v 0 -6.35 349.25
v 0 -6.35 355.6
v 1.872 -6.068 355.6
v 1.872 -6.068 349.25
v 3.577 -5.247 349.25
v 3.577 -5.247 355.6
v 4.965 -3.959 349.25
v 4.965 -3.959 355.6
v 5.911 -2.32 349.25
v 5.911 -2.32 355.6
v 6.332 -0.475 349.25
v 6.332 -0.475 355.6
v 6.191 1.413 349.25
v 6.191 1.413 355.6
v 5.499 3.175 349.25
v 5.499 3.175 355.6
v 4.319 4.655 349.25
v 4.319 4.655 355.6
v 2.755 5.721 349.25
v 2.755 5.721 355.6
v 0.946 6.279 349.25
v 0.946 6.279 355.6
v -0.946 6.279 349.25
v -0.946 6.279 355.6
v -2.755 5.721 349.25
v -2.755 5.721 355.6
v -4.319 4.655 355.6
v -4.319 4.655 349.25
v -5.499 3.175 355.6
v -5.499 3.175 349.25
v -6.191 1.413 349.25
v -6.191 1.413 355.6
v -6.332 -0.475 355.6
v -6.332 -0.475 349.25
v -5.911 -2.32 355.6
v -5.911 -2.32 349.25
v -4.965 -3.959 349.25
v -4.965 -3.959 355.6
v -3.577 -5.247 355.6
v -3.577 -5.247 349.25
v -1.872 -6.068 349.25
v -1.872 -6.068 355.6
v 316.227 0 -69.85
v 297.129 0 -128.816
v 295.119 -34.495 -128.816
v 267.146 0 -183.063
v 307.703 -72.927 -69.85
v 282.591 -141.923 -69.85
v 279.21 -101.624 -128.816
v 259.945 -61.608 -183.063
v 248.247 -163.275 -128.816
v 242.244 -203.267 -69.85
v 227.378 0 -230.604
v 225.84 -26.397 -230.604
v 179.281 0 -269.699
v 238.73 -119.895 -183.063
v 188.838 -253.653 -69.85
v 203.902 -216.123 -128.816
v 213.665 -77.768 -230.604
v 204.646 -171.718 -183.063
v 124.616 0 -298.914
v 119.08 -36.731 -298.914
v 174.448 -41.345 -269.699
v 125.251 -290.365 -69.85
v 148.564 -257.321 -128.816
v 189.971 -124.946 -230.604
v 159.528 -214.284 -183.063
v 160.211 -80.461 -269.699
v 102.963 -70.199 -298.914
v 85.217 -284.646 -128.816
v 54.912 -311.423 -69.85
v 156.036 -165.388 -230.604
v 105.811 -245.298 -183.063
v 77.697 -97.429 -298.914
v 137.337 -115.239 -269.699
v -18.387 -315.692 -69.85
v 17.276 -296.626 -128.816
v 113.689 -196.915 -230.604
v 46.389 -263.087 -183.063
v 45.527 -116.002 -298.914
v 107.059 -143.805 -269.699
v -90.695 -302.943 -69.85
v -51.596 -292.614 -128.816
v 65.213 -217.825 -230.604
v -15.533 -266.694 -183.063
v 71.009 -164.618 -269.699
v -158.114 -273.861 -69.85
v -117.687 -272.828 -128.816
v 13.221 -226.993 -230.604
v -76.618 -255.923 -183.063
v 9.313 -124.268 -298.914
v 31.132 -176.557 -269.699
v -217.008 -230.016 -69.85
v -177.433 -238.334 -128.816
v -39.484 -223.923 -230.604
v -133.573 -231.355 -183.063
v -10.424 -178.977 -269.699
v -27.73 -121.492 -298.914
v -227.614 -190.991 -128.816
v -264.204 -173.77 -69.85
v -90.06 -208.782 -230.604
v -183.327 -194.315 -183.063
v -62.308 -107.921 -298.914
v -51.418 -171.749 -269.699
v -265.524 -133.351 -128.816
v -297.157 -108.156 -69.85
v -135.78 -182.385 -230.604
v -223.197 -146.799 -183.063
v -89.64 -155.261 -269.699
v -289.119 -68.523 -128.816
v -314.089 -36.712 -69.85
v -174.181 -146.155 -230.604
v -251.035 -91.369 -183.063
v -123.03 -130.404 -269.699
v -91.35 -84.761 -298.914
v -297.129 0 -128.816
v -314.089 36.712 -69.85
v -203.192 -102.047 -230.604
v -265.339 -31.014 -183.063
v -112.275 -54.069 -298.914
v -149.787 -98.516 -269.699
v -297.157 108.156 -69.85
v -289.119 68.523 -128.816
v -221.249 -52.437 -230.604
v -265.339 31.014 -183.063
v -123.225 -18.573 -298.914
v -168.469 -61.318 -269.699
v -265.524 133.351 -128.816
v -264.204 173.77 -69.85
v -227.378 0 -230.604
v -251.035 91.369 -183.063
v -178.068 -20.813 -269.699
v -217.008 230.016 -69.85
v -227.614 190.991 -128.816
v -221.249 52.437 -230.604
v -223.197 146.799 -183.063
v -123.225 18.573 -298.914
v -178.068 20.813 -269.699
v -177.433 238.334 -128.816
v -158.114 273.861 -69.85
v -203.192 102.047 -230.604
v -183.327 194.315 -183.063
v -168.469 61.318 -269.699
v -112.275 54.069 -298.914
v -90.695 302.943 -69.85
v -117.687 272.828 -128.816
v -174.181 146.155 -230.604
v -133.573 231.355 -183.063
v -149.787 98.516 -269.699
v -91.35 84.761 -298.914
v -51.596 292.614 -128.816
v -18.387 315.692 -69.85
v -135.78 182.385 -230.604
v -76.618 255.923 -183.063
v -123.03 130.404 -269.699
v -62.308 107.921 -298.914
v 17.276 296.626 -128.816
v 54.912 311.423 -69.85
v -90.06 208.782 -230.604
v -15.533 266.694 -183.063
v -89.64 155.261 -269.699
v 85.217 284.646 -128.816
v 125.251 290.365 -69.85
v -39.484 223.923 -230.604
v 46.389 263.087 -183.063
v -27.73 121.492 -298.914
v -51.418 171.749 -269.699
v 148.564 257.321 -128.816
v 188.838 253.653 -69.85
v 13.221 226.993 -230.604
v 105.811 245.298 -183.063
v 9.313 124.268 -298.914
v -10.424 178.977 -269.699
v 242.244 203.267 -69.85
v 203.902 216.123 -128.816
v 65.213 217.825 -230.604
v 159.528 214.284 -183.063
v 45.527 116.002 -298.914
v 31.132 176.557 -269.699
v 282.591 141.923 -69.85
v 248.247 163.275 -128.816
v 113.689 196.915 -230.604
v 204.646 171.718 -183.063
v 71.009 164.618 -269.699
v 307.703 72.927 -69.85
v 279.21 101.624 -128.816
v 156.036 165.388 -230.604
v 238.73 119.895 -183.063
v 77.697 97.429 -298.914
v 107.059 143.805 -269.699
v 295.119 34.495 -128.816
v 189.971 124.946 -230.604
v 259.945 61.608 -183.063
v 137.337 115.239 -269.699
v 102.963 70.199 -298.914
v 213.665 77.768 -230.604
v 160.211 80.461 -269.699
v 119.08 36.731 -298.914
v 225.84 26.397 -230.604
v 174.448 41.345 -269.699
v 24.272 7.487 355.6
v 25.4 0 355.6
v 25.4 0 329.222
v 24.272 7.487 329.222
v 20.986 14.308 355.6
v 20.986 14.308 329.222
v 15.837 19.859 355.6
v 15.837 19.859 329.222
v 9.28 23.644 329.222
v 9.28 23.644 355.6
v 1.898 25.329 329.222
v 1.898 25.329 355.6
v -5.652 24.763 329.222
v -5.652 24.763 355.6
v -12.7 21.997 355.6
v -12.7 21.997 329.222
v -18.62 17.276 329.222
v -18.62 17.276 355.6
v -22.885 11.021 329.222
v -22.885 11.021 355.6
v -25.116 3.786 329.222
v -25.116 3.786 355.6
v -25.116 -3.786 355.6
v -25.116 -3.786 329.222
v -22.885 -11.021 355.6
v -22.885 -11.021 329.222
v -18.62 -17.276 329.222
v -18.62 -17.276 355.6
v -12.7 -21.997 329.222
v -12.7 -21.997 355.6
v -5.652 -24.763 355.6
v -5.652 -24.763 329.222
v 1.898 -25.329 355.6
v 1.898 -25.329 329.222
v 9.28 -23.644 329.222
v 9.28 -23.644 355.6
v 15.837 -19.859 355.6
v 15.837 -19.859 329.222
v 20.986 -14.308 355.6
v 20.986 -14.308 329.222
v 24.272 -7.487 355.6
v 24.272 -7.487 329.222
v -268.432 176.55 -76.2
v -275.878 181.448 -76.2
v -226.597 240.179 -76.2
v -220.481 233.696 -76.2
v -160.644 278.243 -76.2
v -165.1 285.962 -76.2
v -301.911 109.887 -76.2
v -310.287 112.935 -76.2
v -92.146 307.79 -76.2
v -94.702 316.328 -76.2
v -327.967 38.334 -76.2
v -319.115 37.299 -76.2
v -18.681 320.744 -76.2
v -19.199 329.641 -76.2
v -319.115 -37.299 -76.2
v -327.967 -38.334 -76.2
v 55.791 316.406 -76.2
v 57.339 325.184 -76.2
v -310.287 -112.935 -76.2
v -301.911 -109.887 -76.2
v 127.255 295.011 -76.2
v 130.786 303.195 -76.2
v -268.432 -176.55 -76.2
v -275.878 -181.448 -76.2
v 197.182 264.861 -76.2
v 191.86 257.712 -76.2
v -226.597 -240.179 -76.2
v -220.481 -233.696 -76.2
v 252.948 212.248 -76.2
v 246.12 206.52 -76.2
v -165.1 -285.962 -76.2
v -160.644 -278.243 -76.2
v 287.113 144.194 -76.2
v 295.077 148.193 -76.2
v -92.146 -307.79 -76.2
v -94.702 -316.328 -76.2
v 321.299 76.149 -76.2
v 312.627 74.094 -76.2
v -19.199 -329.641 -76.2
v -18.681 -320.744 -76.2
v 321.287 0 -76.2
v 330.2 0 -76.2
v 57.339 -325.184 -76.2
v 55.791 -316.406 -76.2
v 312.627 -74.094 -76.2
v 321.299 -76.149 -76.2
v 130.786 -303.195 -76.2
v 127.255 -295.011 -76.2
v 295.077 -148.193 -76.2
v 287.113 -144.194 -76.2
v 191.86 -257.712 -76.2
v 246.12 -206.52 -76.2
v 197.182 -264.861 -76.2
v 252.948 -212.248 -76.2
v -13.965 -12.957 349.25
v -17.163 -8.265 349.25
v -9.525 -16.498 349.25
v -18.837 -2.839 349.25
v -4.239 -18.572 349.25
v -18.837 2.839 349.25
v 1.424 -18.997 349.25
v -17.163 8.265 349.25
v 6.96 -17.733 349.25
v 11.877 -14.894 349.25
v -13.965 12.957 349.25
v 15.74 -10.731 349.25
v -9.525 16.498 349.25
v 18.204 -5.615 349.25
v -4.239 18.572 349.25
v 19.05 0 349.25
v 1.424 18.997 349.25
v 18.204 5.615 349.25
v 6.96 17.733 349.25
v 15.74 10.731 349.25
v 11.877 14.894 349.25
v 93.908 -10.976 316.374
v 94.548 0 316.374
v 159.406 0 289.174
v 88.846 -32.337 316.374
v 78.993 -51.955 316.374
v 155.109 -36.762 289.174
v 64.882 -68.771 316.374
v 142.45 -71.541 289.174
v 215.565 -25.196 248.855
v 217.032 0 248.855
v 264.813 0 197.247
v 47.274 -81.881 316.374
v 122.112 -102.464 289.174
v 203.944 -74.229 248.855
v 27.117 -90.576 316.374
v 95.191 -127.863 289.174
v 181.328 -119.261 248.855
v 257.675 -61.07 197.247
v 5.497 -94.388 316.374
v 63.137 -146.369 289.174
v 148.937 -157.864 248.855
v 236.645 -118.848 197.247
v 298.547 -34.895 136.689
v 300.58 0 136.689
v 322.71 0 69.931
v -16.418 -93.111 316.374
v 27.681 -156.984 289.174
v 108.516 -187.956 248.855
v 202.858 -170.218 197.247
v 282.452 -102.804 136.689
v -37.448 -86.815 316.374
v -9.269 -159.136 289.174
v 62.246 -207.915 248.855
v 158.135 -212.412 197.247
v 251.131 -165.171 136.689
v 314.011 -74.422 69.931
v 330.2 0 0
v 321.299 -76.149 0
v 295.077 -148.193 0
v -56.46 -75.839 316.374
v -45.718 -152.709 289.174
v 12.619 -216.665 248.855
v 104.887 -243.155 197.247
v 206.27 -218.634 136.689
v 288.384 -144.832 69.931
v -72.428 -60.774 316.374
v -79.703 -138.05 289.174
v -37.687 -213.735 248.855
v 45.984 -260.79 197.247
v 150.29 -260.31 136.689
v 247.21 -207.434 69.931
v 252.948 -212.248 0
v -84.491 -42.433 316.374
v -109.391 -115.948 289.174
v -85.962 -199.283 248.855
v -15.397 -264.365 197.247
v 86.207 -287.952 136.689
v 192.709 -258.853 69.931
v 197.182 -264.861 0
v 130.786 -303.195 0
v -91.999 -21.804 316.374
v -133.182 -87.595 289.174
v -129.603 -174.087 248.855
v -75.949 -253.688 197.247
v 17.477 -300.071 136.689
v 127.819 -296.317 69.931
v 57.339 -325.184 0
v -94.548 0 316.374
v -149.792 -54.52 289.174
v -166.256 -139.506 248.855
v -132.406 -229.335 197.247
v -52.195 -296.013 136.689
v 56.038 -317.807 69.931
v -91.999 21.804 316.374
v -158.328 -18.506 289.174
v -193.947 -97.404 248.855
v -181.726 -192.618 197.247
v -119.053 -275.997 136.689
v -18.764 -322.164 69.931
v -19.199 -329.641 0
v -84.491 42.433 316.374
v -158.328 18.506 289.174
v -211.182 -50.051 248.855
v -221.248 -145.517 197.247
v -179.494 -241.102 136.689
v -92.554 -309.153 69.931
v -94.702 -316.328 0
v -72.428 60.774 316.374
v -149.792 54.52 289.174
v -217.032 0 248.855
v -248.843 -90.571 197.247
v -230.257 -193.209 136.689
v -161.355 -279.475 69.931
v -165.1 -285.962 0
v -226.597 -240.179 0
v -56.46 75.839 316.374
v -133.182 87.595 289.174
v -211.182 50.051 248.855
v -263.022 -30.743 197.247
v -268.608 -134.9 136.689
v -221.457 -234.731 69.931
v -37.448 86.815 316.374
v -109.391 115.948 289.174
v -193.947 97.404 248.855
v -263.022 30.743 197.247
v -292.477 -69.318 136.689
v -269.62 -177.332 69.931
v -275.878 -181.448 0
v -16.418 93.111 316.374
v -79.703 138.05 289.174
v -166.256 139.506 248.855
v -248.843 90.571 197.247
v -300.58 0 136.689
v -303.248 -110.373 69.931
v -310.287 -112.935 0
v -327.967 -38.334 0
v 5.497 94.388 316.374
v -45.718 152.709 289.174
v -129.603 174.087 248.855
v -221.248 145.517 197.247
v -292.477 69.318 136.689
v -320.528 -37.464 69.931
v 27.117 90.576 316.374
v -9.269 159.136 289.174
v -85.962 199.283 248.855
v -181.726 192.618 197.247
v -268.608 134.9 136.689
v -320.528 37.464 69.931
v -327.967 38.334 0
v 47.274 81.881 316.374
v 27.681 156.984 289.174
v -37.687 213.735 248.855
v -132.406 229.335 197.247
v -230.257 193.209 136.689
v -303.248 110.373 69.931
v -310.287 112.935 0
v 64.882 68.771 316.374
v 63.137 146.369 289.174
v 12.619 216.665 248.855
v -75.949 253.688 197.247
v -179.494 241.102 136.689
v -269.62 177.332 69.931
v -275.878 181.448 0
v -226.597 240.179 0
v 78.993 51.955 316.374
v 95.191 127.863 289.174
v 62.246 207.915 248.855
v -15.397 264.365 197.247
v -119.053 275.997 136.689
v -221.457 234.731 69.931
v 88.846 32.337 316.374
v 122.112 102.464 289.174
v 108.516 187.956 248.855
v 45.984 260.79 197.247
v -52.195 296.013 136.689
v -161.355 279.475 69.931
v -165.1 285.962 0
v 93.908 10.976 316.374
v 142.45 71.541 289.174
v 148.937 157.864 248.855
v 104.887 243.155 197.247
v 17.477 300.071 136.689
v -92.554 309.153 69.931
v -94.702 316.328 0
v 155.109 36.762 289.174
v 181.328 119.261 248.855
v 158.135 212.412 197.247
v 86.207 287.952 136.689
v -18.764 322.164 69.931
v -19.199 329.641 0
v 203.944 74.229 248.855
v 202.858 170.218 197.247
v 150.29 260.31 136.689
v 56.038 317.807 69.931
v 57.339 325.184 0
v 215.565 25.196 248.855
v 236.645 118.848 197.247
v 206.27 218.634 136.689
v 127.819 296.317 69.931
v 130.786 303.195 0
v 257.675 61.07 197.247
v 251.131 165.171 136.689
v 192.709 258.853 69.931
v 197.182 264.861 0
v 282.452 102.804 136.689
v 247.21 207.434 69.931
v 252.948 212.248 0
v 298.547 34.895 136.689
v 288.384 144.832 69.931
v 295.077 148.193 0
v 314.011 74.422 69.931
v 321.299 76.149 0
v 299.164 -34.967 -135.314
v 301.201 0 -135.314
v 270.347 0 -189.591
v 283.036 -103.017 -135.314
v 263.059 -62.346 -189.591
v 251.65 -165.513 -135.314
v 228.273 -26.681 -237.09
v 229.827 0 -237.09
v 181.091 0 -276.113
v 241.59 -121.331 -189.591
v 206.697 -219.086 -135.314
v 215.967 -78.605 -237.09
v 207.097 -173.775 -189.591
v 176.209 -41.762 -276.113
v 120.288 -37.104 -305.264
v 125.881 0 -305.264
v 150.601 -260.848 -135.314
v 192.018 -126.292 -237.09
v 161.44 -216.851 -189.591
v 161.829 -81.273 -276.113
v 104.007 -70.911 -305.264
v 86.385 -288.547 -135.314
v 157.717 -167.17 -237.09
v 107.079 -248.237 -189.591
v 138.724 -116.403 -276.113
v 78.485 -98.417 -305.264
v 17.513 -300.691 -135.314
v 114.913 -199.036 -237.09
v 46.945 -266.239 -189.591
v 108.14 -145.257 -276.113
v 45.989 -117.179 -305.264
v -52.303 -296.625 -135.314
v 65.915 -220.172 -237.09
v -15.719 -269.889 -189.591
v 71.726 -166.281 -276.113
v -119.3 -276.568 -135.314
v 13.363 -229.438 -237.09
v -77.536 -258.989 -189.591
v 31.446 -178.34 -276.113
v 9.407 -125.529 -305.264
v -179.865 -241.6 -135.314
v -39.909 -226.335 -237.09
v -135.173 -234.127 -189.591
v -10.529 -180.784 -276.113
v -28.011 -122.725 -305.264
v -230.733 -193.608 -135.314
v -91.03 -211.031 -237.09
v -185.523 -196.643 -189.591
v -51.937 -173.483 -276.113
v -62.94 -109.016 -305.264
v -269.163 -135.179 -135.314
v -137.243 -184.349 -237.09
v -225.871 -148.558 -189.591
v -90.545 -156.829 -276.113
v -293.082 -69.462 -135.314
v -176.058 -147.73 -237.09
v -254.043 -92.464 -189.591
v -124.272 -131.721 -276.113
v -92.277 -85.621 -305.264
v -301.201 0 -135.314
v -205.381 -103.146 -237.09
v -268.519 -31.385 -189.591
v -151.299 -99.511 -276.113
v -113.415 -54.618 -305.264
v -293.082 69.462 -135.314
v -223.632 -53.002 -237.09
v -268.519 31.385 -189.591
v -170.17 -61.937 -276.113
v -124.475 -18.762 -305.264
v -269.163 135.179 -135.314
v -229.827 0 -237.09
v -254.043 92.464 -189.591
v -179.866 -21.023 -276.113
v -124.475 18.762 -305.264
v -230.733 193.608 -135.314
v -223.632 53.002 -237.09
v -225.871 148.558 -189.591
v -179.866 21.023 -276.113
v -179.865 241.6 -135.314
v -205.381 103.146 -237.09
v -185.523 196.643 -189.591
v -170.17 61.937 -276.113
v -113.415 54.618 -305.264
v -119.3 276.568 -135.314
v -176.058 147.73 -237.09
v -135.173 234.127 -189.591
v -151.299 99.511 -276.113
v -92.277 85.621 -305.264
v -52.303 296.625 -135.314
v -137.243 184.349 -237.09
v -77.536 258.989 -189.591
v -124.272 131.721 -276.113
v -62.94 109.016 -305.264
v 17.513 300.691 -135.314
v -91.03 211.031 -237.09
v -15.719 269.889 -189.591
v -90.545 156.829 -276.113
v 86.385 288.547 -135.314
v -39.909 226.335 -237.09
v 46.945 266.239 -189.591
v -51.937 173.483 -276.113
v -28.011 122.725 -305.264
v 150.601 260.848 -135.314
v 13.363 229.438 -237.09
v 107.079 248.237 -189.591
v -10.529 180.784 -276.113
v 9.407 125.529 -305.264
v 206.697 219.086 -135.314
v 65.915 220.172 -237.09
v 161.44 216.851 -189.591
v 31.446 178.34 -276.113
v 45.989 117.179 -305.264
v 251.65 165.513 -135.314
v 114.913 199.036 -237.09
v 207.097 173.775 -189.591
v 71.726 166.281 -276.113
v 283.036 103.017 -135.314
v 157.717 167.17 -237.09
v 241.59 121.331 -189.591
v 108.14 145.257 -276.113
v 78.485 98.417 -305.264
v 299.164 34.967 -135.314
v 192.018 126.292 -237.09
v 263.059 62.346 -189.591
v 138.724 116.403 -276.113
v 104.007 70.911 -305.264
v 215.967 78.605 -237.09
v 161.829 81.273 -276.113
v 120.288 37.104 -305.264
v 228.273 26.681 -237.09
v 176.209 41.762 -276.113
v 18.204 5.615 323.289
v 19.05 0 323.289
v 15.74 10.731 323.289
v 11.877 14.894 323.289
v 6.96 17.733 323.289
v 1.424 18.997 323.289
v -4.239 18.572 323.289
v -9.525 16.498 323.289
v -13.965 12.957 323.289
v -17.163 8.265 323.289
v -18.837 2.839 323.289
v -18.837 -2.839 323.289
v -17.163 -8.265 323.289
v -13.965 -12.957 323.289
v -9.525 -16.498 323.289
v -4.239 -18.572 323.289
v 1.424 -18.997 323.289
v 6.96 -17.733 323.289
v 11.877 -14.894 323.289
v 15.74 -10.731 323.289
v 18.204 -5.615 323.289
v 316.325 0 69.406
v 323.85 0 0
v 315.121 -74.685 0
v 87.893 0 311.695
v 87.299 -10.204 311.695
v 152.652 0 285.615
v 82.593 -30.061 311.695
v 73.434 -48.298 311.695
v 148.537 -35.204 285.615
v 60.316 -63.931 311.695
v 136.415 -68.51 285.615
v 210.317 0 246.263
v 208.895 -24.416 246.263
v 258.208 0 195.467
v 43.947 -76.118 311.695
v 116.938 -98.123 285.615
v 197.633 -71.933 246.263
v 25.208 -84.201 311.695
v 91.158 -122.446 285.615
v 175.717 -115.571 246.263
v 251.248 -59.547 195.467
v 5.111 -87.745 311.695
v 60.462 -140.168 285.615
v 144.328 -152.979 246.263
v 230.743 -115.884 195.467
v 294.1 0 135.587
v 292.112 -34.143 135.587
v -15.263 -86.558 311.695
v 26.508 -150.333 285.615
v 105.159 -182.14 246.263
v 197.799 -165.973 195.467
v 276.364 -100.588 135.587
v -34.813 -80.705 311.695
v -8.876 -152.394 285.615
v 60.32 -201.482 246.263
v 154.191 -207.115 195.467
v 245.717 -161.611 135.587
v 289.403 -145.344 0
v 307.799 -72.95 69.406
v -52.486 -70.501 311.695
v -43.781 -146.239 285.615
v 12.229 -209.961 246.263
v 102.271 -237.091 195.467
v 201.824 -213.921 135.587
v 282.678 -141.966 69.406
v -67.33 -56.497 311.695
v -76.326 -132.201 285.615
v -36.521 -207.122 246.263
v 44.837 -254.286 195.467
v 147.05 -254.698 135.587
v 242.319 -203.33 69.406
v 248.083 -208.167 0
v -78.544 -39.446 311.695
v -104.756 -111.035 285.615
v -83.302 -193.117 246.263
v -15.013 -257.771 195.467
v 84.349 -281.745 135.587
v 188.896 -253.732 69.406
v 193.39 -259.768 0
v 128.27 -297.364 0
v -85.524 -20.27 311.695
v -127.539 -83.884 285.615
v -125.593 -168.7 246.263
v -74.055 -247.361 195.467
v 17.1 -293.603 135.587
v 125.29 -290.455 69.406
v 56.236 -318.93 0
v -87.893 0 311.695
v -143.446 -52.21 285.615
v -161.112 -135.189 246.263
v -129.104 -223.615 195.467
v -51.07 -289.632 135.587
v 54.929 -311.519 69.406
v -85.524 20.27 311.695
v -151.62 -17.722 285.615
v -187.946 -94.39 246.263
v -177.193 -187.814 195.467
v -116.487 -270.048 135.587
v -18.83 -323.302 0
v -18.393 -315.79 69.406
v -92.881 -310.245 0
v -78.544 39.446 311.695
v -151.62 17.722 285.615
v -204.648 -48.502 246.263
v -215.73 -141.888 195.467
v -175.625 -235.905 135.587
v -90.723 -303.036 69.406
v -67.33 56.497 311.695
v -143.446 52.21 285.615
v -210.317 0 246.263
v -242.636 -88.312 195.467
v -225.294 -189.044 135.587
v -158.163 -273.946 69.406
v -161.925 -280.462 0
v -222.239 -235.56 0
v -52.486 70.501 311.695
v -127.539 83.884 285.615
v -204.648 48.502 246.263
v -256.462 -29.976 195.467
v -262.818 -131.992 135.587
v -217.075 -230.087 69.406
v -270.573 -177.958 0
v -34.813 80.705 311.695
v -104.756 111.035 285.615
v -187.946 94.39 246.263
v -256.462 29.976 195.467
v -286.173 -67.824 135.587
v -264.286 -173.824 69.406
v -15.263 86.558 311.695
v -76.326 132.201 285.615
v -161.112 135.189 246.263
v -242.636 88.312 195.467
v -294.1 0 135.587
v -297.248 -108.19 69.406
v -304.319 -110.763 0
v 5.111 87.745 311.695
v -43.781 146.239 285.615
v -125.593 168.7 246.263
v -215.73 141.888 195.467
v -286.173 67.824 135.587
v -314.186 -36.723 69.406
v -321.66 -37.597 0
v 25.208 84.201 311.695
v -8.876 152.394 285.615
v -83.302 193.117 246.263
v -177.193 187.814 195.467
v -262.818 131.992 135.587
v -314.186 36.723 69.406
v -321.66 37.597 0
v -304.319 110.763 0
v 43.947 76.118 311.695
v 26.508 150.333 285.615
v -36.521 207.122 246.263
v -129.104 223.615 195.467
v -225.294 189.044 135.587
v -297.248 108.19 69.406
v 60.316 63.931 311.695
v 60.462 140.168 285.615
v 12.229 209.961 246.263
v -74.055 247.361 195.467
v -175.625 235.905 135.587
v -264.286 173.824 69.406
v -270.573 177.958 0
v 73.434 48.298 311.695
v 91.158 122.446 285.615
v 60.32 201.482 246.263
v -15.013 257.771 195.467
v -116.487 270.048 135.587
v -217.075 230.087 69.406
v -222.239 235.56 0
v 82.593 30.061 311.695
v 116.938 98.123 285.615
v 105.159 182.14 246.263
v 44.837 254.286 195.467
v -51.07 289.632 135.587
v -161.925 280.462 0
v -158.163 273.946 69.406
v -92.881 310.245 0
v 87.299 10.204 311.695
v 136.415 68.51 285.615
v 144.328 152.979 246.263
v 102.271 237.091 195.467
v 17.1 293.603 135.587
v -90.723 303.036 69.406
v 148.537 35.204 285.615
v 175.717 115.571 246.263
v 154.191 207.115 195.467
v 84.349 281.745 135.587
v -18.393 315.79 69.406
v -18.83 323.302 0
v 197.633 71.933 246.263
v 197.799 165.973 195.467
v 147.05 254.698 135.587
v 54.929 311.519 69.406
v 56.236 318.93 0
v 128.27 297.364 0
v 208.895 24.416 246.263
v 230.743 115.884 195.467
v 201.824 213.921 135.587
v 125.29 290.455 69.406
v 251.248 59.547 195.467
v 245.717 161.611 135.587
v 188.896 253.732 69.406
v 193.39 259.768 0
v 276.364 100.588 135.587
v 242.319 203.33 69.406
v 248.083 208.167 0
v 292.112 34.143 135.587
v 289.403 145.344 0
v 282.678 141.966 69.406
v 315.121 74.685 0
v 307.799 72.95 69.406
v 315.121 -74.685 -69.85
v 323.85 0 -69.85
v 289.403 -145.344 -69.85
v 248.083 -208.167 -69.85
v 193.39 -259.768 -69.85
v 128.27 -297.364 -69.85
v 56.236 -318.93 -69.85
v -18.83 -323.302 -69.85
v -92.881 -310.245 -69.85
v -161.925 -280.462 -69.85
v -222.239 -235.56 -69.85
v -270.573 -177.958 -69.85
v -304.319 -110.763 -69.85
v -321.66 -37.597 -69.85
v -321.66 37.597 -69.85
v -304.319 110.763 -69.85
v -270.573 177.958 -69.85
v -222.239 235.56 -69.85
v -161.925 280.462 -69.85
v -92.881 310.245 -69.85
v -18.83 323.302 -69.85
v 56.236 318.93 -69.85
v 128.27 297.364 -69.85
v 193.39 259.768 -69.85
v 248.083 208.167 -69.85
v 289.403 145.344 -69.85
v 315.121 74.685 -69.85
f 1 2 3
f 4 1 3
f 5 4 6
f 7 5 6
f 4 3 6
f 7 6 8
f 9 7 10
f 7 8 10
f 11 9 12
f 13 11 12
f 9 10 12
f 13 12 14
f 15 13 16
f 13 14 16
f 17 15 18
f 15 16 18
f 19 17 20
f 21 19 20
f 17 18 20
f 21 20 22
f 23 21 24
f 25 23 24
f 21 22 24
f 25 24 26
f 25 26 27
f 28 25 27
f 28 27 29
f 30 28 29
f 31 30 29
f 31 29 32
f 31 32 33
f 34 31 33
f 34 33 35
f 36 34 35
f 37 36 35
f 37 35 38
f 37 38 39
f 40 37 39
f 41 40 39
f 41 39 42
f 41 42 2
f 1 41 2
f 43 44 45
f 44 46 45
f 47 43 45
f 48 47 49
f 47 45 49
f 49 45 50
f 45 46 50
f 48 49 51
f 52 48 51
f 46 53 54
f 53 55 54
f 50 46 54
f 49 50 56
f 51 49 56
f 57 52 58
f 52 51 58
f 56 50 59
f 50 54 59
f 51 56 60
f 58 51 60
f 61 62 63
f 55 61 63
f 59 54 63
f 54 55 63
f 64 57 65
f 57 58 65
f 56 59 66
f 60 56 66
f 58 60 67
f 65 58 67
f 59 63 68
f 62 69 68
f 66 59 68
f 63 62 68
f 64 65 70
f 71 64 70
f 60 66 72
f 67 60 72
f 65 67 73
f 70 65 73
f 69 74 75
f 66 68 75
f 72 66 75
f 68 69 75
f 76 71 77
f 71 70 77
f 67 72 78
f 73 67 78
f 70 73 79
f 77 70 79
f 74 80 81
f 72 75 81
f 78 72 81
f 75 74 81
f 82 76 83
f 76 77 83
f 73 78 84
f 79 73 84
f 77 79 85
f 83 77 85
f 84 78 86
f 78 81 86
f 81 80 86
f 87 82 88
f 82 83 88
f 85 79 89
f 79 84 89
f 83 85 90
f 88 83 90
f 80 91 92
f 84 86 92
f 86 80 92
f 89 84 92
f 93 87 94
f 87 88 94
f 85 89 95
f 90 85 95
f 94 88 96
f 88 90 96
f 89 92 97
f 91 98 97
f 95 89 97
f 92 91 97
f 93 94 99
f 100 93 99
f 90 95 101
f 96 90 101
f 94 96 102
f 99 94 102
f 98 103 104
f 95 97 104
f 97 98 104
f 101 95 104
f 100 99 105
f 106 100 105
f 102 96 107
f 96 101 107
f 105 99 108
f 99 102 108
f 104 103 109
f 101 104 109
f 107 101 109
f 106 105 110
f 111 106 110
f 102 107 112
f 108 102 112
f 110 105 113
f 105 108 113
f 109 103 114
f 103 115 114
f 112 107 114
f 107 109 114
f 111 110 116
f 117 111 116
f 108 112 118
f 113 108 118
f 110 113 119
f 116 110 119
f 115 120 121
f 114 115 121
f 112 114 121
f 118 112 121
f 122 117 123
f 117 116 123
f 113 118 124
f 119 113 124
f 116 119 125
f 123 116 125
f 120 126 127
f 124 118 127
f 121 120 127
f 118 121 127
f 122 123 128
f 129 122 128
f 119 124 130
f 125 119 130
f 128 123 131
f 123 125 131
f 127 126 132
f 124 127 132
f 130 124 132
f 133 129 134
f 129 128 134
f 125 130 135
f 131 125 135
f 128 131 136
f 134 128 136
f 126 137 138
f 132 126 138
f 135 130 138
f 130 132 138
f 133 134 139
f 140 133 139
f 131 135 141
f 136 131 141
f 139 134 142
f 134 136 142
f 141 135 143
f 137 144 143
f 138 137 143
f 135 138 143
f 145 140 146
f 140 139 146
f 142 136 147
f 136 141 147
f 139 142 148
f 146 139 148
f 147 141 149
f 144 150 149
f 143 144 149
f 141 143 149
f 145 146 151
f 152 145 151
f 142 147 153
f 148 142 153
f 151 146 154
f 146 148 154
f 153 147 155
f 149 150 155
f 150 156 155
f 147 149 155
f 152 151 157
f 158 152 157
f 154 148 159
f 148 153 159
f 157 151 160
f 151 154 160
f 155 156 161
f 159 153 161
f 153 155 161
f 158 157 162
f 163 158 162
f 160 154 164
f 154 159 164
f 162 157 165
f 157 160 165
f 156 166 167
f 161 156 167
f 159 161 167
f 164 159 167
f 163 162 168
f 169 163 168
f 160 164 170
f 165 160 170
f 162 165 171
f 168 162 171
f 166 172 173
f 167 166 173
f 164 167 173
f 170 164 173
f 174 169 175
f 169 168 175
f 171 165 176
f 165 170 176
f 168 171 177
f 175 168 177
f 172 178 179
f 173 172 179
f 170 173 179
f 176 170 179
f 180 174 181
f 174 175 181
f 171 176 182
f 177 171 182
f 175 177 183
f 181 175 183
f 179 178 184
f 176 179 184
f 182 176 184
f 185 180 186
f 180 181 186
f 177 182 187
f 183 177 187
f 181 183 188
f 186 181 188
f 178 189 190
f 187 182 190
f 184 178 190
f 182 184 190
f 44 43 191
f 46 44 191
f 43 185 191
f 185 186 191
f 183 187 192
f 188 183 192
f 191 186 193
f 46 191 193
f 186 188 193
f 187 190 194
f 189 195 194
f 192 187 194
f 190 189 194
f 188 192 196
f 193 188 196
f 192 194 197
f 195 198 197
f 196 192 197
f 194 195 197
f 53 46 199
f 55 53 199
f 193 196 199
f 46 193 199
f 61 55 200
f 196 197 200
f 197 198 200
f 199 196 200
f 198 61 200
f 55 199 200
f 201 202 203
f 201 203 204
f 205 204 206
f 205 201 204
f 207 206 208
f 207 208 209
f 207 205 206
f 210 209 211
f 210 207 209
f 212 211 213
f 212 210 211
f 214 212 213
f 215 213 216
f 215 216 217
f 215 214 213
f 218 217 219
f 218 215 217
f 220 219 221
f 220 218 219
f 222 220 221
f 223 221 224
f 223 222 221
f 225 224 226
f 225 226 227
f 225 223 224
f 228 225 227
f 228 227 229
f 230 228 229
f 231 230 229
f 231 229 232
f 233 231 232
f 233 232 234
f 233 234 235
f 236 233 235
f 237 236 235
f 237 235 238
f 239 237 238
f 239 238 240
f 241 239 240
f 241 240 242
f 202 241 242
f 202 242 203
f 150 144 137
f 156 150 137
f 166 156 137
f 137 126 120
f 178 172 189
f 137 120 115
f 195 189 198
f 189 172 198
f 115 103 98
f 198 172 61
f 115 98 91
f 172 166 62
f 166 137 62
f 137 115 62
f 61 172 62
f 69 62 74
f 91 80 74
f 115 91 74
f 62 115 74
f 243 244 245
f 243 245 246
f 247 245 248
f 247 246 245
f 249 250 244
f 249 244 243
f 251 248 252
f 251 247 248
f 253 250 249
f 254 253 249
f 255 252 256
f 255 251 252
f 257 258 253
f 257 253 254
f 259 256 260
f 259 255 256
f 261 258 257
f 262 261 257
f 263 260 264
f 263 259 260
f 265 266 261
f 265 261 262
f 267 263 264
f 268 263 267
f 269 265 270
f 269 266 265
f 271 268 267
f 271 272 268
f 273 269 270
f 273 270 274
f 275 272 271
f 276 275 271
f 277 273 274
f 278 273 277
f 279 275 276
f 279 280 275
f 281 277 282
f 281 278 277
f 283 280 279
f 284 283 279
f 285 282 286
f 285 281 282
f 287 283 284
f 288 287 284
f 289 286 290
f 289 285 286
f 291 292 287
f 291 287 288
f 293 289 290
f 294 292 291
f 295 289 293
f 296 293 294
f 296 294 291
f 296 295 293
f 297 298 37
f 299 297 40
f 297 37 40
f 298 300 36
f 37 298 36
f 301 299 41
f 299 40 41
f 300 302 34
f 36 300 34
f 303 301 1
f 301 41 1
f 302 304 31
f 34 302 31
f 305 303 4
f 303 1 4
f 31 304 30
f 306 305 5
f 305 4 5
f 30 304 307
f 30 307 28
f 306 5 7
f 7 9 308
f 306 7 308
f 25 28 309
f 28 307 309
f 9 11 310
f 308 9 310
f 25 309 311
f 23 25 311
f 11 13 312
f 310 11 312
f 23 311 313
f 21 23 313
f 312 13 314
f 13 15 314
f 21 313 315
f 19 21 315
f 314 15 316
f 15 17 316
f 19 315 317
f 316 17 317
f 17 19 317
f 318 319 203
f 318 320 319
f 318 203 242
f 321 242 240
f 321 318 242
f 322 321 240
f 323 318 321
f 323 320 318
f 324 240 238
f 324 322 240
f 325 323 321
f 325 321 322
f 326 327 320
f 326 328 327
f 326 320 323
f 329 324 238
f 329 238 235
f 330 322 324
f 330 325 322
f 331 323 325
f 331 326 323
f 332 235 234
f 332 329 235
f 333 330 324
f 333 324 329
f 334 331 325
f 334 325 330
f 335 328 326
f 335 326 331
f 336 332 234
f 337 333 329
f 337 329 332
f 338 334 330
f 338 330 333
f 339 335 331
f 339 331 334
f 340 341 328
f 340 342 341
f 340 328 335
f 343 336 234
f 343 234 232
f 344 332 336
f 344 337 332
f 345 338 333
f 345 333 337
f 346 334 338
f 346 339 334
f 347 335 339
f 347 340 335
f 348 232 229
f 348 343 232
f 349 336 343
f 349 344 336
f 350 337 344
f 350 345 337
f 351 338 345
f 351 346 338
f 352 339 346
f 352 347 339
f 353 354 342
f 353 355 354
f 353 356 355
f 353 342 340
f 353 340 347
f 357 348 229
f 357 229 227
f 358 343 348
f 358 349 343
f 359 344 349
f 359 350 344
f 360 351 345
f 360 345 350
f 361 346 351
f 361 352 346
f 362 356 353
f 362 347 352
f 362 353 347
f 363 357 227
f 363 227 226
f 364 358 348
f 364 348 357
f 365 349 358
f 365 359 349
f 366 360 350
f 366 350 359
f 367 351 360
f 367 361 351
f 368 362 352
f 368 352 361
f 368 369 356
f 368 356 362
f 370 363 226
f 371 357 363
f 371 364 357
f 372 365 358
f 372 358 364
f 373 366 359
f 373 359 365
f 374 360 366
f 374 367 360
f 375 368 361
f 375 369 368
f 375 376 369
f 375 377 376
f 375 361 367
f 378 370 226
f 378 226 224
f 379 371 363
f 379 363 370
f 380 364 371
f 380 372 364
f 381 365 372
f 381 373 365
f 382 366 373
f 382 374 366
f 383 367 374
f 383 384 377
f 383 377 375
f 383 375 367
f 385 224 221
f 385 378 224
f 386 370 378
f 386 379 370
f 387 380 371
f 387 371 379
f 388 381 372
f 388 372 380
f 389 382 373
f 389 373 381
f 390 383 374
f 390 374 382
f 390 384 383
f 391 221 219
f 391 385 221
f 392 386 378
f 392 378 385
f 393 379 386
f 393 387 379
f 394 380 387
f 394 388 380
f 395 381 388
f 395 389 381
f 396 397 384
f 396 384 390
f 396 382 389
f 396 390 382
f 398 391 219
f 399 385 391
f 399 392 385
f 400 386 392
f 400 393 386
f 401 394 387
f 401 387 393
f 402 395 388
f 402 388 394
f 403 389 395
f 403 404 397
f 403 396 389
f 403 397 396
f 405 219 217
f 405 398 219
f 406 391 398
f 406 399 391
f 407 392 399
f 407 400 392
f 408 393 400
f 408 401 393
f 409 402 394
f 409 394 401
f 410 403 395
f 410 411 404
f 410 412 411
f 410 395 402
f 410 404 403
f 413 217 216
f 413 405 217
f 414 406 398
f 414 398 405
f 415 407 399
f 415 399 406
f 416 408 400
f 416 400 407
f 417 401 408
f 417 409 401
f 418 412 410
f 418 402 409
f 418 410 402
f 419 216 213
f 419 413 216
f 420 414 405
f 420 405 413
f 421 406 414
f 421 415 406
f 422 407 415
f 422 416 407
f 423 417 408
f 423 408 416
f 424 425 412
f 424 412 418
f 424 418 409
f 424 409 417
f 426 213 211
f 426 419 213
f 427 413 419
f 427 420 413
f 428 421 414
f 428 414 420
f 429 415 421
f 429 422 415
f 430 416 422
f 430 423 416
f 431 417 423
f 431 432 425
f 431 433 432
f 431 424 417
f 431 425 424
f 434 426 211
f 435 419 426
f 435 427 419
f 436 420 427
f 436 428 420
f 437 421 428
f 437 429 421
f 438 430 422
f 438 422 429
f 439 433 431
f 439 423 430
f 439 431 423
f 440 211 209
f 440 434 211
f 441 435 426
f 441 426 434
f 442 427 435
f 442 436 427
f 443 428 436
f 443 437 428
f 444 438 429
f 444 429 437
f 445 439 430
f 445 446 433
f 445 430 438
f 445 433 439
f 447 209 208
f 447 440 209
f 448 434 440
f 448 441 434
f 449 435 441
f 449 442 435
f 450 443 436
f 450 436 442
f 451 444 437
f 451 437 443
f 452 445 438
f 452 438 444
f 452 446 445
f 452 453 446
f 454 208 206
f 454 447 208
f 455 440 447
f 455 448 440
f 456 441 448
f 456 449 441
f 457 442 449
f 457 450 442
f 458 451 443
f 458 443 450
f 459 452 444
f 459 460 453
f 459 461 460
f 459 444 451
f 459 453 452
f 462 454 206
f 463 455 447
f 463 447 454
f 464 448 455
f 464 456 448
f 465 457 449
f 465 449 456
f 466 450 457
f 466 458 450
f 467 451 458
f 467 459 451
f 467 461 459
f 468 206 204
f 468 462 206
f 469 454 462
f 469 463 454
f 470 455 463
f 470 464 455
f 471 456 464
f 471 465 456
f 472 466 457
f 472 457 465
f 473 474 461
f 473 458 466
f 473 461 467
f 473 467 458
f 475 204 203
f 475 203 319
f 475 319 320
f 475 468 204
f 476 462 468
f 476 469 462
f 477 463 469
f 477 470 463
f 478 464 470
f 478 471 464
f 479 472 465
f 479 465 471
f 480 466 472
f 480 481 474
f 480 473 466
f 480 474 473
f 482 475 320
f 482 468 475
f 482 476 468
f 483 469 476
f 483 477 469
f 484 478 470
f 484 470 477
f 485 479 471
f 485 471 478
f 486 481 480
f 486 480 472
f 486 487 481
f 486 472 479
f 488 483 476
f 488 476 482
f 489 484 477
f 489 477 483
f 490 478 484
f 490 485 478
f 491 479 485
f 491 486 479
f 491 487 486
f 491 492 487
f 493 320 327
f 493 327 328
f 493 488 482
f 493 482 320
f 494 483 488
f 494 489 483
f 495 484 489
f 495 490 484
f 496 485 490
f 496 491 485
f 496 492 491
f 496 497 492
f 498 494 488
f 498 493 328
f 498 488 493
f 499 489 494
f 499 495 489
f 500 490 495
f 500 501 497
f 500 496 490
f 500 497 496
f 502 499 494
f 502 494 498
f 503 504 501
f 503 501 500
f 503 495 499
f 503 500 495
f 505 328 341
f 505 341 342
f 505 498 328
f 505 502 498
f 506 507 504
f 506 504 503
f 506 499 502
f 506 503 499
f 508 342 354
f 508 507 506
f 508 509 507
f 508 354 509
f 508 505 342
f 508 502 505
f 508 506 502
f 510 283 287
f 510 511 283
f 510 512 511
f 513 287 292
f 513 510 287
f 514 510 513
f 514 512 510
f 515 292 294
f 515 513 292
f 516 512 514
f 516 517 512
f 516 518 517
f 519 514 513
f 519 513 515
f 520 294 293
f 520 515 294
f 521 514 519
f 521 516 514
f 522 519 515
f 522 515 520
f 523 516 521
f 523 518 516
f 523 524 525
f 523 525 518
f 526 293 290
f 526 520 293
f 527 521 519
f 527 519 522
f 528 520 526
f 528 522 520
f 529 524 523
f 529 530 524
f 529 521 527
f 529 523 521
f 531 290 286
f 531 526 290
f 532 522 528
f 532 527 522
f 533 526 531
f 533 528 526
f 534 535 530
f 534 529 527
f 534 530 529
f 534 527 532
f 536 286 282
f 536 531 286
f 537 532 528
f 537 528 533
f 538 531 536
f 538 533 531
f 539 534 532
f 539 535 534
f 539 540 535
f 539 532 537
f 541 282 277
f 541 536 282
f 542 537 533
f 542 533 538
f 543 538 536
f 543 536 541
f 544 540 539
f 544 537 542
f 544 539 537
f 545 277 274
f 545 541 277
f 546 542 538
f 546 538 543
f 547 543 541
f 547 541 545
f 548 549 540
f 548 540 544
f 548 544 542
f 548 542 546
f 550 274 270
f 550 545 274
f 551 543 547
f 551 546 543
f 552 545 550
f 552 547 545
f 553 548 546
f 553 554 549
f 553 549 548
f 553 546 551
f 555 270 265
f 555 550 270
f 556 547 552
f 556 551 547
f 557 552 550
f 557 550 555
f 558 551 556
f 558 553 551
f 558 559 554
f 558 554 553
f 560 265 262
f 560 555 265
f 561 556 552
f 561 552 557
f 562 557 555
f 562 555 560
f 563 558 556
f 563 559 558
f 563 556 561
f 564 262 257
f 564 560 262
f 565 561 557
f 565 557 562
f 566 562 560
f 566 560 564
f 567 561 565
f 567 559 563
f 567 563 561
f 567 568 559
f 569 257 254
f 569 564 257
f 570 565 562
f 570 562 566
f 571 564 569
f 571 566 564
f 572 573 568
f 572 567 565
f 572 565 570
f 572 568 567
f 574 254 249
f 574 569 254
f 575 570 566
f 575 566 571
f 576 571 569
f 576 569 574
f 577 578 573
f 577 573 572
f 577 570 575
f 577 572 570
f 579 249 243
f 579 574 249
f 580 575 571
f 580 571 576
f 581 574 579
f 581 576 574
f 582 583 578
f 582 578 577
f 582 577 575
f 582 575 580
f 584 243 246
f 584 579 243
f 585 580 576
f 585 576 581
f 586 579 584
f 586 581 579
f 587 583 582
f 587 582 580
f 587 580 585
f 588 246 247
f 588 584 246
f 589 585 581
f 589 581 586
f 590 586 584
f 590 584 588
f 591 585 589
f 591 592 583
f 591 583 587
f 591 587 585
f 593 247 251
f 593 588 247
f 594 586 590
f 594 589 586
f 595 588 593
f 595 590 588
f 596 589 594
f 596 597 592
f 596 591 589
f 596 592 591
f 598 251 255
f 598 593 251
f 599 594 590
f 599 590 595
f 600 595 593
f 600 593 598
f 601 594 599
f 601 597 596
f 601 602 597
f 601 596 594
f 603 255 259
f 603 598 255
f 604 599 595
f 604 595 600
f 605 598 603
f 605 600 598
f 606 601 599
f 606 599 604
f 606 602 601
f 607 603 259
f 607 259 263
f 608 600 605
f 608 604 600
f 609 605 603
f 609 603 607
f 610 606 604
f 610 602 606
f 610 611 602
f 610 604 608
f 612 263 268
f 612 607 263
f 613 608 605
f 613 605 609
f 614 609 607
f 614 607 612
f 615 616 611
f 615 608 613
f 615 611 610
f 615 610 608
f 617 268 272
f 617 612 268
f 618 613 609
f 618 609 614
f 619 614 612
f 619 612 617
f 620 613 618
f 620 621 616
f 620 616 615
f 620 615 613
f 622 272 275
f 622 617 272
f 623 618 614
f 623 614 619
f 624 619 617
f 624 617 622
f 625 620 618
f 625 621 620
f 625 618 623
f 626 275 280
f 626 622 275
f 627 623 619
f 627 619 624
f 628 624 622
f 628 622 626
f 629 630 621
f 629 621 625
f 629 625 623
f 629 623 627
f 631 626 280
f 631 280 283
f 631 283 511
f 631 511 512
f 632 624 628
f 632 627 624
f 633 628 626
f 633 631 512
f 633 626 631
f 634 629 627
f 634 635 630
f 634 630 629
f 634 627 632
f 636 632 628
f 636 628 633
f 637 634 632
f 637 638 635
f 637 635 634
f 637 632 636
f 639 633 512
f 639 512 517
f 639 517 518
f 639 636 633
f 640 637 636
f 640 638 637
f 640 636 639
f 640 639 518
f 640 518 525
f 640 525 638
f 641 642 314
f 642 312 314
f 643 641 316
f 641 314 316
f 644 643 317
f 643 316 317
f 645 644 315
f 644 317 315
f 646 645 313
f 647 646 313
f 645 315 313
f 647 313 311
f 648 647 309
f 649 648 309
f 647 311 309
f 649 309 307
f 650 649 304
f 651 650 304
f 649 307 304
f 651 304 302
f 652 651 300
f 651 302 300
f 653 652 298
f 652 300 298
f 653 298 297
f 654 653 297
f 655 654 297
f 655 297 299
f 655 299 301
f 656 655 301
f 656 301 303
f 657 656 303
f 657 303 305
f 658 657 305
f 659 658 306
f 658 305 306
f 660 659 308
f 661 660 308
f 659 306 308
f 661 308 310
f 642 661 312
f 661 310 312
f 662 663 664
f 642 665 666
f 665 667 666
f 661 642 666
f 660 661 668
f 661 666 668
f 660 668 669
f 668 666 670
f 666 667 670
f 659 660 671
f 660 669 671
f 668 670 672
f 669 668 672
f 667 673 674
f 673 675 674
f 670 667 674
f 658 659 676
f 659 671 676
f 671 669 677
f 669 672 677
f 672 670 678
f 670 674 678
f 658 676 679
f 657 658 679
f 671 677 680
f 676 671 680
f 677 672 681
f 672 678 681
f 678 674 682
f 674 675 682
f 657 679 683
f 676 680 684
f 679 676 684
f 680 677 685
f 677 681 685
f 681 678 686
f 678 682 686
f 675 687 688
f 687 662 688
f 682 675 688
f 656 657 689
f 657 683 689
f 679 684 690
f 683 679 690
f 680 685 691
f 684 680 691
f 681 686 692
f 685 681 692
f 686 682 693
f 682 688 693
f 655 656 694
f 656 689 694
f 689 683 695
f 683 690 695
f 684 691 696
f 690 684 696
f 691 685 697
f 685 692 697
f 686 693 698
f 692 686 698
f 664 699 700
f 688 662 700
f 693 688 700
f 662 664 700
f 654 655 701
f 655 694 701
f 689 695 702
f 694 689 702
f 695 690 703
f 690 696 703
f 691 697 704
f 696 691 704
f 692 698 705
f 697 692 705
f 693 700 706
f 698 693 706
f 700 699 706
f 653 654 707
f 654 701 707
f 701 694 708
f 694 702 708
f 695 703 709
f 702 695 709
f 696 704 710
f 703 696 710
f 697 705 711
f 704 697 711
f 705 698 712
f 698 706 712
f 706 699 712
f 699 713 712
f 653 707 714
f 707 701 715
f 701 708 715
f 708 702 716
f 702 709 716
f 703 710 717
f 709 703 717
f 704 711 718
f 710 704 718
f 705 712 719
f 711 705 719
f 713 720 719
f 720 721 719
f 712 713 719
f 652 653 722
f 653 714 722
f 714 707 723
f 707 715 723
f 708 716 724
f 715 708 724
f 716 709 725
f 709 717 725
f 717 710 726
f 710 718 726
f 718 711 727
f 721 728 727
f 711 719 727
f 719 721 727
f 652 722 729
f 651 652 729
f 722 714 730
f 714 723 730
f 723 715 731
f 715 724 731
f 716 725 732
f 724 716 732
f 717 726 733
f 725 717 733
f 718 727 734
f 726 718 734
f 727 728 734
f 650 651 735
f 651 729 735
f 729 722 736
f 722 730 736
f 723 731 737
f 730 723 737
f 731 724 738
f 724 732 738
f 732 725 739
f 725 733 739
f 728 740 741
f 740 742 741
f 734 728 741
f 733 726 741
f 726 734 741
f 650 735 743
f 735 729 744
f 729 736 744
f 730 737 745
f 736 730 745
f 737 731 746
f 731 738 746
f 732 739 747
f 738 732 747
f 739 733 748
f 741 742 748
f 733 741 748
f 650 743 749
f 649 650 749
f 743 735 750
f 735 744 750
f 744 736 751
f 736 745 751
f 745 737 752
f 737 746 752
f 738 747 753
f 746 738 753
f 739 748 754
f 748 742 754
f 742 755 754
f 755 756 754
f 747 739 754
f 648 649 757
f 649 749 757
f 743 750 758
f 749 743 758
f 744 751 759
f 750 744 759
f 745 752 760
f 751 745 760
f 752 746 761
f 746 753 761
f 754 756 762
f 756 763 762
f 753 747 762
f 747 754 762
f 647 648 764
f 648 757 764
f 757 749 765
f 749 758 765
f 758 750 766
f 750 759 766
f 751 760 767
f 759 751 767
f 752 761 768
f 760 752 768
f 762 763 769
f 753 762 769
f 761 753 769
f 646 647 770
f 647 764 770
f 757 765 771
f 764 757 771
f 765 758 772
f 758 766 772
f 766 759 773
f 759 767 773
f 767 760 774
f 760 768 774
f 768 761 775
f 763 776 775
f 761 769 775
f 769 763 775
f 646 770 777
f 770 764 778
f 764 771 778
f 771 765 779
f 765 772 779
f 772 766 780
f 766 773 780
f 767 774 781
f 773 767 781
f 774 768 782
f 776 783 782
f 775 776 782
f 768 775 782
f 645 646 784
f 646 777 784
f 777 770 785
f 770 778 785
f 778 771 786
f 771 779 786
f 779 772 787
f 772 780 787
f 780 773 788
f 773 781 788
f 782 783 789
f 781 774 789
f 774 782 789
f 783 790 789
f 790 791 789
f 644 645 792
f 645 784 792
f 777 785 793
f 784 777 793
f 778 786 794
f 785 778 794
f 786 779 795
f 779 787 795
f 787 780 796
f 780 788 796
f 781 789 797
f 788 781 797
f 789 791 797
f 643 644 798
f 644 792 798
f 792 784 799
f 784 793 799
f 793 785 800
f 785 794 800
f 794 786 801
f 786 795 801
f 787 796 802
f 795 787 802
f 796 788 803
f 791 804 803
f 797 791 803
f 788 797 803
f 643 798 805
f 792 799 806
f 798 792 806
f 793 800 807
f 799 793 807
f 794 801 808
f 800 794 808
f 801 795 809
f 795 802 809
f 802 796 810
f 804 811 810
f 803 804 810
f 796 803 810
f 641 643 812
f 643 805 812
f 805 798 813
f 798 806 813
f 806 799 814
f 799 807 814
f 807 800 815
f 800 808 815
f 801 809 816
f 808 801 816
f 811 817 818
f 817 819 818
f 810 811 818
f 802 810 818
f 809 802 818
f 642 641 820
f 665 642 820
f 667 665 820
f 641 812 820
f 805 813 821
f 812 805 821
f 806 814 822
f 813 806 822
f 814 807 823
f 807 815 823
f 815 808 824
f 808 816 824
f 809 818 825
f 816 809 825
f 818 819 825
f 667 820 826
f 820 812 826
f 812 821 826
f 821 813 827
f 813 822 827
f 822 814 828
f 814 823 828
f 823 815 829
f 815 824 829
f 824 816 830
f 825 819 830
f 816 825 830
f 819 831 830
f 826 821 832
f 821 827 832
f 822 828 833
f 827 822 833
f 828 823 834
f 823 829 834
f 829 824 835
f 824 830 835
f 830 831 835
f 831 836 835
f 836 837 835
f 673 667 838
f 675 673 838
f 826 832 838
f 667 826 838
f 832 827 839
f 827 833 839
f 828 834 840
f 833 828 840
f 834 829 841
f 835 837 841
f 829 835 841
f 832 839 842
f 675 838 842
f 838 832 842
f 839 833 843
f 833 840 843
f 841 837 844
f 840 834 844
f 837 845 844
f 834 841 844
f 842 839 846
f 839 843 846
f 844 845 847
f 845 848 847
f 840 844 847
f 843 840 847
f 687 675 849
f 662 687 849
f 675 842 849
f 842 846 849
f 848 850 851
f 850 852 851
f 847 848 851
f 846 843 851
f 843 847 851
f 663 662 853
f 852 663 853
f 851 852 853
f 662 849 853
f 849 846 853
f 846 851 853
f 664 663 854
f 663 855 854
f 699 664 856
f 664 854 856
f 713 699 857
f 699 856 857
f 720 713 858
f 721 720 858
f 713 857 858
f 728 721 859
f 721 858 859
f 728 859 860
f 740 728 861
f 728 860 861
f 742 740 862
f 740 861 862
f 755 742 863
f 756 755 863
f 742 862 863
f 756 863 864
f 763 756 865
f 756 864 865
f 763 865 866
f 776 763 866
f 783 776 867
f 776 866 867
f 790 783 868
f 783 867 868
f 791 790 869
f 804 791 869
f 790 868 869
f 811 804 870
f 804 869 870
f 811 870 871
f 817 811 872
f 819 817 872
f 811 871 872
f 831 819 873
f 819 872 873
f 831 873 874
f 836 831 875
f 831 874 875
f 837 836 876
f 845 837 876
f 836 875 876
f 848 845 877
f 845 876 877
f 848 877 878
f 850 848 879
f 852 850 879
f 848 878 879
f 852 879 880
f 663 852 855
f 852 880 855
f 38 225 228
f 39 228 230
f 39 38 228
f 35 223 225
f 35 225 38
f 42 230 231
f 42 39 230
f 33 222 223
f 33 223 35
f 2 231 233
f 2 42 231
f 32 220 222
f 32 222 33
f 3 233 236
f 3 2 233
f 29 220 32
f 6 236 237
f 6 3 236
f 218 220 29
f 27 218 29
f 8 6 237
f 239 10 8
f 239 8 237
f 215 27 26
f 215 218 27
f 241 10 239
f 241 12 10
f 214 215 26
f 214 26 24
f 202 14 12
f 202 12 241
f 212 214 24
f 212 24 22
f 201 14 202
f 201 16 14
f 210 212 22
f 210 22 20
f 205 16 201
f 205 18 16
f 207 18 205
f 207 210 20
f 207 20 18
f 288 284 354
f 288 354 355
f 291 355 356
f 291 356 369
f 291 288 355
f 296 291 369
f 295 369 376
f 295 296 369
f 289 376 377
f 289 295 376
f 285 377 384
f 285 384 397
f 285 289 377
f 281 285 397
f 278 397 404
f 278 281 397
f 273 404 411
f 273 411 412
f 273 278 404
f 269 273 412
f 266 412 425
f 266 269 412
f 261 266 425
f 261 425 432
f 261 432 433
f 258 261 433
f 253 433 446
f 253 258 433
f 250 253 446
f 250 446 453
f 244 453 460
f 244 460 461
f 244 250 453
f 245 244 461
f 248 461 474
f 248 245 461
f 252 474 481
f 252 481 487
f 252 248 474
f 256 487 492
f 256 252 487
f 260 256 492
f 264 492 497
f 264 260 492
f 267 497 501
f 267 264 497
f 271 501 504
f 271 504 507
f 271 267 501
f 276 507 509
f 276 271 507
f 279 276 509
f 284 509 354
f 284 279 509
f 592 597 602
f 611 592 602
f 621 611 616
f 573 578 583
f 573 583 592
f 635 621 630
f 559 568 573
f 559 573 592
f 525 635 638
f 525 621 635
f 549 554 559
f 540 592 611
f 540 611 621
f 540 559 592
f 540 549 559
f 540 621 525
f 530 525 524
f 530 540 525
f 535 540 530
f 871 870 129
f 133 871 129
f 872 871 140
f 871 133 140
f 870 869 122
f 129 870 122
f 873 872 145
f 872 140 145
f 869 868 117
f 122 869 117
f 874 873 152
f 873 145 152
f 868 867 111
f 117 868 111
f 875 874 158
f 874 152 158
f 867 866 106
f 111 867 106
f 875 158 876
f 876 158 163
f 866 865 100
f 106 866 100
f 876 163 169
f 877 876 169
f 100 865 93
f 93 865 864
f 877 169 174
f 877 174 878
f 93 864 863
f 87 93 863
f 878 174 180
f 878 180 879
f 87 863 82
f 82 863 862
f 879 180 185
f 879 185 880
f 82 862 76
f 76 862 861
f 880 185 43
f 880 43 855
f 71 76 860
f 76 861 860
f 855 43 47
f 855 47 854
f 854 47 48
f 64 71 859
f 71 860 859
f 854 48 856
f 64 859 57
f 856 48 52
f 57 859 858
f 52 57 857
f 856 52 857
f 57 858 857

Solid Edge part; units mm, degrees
sketch "Sketch1" plane through (0, 0, 0) normal (0, -1, 0) x (1, 0, 0)
  line L0 (0, 0) -> (0, -330.2)
  line L1 (0, 0) -> (0, 330.2)
  arc A0 (0, 330.2) -> (0, -330.2) centre (0, 0) cw
revolve "RevolvedProtrusion1" add sketch "Sketch1" angle 360 about axis through (0, 0, 0) along (0, 0, 1)
sketch "Sketch2" plane through (0, 0, 0) normal (0, -1, 0) x (1, 0, 0)
  line L0 (0, -305.264) -> (125.8807, -305.264)
revolve "RevolvedCutout1" cut sketch "Sketch2" angle 360 about axis through (0, 0, -305.264) along (0, 0, -1) material side at (62.9404, 0, -305.314)
sketch "Sketch3" plane through (0, 0, 0) normal (0, -1, 0) x (1, 0, 0)
  line L0 (0, -76.2) -> (330.2, -76.2)
  line L1 (330.2, 0) -> (330.2, -76.2)
  line L2 (0, 0) -> (330.2, 0)
  line L3 (0, 0) -> (0, -76.2)
revolve "RevolvedProtrusion2" add sketch "Sketch3" angle 360 about axis through (0, 0, 0) along (0, 0, -1)
sketch "Sketch4" plane through (0, 0, 330.2) normal (0, 0, 1) x (1, 0, 0)
  circle A0 centre (0, 0) radius 25.4
extrude "Protrusion1" add sketch "Sketch4" against normal up to vertex (330.2 mm away) and the other way blind 25.4
shell "Thinwall_1" thickness 6.35 removed faces 1 at (-17.4413, -16.4253, 355.6)
sketch "Sketch5" plane through (0, 0, 355.6) normal (0, 0, 1) x (0, -1, 0)
  circle A0 centre (0, 0) radius 19.05
  circle A1 centre (0, 0) radius 6.35
  dimension "D1" = 12.7
extrude "ExtrudedProtrusion_3" add sketch "Sketch5" against normal blind 6.35
